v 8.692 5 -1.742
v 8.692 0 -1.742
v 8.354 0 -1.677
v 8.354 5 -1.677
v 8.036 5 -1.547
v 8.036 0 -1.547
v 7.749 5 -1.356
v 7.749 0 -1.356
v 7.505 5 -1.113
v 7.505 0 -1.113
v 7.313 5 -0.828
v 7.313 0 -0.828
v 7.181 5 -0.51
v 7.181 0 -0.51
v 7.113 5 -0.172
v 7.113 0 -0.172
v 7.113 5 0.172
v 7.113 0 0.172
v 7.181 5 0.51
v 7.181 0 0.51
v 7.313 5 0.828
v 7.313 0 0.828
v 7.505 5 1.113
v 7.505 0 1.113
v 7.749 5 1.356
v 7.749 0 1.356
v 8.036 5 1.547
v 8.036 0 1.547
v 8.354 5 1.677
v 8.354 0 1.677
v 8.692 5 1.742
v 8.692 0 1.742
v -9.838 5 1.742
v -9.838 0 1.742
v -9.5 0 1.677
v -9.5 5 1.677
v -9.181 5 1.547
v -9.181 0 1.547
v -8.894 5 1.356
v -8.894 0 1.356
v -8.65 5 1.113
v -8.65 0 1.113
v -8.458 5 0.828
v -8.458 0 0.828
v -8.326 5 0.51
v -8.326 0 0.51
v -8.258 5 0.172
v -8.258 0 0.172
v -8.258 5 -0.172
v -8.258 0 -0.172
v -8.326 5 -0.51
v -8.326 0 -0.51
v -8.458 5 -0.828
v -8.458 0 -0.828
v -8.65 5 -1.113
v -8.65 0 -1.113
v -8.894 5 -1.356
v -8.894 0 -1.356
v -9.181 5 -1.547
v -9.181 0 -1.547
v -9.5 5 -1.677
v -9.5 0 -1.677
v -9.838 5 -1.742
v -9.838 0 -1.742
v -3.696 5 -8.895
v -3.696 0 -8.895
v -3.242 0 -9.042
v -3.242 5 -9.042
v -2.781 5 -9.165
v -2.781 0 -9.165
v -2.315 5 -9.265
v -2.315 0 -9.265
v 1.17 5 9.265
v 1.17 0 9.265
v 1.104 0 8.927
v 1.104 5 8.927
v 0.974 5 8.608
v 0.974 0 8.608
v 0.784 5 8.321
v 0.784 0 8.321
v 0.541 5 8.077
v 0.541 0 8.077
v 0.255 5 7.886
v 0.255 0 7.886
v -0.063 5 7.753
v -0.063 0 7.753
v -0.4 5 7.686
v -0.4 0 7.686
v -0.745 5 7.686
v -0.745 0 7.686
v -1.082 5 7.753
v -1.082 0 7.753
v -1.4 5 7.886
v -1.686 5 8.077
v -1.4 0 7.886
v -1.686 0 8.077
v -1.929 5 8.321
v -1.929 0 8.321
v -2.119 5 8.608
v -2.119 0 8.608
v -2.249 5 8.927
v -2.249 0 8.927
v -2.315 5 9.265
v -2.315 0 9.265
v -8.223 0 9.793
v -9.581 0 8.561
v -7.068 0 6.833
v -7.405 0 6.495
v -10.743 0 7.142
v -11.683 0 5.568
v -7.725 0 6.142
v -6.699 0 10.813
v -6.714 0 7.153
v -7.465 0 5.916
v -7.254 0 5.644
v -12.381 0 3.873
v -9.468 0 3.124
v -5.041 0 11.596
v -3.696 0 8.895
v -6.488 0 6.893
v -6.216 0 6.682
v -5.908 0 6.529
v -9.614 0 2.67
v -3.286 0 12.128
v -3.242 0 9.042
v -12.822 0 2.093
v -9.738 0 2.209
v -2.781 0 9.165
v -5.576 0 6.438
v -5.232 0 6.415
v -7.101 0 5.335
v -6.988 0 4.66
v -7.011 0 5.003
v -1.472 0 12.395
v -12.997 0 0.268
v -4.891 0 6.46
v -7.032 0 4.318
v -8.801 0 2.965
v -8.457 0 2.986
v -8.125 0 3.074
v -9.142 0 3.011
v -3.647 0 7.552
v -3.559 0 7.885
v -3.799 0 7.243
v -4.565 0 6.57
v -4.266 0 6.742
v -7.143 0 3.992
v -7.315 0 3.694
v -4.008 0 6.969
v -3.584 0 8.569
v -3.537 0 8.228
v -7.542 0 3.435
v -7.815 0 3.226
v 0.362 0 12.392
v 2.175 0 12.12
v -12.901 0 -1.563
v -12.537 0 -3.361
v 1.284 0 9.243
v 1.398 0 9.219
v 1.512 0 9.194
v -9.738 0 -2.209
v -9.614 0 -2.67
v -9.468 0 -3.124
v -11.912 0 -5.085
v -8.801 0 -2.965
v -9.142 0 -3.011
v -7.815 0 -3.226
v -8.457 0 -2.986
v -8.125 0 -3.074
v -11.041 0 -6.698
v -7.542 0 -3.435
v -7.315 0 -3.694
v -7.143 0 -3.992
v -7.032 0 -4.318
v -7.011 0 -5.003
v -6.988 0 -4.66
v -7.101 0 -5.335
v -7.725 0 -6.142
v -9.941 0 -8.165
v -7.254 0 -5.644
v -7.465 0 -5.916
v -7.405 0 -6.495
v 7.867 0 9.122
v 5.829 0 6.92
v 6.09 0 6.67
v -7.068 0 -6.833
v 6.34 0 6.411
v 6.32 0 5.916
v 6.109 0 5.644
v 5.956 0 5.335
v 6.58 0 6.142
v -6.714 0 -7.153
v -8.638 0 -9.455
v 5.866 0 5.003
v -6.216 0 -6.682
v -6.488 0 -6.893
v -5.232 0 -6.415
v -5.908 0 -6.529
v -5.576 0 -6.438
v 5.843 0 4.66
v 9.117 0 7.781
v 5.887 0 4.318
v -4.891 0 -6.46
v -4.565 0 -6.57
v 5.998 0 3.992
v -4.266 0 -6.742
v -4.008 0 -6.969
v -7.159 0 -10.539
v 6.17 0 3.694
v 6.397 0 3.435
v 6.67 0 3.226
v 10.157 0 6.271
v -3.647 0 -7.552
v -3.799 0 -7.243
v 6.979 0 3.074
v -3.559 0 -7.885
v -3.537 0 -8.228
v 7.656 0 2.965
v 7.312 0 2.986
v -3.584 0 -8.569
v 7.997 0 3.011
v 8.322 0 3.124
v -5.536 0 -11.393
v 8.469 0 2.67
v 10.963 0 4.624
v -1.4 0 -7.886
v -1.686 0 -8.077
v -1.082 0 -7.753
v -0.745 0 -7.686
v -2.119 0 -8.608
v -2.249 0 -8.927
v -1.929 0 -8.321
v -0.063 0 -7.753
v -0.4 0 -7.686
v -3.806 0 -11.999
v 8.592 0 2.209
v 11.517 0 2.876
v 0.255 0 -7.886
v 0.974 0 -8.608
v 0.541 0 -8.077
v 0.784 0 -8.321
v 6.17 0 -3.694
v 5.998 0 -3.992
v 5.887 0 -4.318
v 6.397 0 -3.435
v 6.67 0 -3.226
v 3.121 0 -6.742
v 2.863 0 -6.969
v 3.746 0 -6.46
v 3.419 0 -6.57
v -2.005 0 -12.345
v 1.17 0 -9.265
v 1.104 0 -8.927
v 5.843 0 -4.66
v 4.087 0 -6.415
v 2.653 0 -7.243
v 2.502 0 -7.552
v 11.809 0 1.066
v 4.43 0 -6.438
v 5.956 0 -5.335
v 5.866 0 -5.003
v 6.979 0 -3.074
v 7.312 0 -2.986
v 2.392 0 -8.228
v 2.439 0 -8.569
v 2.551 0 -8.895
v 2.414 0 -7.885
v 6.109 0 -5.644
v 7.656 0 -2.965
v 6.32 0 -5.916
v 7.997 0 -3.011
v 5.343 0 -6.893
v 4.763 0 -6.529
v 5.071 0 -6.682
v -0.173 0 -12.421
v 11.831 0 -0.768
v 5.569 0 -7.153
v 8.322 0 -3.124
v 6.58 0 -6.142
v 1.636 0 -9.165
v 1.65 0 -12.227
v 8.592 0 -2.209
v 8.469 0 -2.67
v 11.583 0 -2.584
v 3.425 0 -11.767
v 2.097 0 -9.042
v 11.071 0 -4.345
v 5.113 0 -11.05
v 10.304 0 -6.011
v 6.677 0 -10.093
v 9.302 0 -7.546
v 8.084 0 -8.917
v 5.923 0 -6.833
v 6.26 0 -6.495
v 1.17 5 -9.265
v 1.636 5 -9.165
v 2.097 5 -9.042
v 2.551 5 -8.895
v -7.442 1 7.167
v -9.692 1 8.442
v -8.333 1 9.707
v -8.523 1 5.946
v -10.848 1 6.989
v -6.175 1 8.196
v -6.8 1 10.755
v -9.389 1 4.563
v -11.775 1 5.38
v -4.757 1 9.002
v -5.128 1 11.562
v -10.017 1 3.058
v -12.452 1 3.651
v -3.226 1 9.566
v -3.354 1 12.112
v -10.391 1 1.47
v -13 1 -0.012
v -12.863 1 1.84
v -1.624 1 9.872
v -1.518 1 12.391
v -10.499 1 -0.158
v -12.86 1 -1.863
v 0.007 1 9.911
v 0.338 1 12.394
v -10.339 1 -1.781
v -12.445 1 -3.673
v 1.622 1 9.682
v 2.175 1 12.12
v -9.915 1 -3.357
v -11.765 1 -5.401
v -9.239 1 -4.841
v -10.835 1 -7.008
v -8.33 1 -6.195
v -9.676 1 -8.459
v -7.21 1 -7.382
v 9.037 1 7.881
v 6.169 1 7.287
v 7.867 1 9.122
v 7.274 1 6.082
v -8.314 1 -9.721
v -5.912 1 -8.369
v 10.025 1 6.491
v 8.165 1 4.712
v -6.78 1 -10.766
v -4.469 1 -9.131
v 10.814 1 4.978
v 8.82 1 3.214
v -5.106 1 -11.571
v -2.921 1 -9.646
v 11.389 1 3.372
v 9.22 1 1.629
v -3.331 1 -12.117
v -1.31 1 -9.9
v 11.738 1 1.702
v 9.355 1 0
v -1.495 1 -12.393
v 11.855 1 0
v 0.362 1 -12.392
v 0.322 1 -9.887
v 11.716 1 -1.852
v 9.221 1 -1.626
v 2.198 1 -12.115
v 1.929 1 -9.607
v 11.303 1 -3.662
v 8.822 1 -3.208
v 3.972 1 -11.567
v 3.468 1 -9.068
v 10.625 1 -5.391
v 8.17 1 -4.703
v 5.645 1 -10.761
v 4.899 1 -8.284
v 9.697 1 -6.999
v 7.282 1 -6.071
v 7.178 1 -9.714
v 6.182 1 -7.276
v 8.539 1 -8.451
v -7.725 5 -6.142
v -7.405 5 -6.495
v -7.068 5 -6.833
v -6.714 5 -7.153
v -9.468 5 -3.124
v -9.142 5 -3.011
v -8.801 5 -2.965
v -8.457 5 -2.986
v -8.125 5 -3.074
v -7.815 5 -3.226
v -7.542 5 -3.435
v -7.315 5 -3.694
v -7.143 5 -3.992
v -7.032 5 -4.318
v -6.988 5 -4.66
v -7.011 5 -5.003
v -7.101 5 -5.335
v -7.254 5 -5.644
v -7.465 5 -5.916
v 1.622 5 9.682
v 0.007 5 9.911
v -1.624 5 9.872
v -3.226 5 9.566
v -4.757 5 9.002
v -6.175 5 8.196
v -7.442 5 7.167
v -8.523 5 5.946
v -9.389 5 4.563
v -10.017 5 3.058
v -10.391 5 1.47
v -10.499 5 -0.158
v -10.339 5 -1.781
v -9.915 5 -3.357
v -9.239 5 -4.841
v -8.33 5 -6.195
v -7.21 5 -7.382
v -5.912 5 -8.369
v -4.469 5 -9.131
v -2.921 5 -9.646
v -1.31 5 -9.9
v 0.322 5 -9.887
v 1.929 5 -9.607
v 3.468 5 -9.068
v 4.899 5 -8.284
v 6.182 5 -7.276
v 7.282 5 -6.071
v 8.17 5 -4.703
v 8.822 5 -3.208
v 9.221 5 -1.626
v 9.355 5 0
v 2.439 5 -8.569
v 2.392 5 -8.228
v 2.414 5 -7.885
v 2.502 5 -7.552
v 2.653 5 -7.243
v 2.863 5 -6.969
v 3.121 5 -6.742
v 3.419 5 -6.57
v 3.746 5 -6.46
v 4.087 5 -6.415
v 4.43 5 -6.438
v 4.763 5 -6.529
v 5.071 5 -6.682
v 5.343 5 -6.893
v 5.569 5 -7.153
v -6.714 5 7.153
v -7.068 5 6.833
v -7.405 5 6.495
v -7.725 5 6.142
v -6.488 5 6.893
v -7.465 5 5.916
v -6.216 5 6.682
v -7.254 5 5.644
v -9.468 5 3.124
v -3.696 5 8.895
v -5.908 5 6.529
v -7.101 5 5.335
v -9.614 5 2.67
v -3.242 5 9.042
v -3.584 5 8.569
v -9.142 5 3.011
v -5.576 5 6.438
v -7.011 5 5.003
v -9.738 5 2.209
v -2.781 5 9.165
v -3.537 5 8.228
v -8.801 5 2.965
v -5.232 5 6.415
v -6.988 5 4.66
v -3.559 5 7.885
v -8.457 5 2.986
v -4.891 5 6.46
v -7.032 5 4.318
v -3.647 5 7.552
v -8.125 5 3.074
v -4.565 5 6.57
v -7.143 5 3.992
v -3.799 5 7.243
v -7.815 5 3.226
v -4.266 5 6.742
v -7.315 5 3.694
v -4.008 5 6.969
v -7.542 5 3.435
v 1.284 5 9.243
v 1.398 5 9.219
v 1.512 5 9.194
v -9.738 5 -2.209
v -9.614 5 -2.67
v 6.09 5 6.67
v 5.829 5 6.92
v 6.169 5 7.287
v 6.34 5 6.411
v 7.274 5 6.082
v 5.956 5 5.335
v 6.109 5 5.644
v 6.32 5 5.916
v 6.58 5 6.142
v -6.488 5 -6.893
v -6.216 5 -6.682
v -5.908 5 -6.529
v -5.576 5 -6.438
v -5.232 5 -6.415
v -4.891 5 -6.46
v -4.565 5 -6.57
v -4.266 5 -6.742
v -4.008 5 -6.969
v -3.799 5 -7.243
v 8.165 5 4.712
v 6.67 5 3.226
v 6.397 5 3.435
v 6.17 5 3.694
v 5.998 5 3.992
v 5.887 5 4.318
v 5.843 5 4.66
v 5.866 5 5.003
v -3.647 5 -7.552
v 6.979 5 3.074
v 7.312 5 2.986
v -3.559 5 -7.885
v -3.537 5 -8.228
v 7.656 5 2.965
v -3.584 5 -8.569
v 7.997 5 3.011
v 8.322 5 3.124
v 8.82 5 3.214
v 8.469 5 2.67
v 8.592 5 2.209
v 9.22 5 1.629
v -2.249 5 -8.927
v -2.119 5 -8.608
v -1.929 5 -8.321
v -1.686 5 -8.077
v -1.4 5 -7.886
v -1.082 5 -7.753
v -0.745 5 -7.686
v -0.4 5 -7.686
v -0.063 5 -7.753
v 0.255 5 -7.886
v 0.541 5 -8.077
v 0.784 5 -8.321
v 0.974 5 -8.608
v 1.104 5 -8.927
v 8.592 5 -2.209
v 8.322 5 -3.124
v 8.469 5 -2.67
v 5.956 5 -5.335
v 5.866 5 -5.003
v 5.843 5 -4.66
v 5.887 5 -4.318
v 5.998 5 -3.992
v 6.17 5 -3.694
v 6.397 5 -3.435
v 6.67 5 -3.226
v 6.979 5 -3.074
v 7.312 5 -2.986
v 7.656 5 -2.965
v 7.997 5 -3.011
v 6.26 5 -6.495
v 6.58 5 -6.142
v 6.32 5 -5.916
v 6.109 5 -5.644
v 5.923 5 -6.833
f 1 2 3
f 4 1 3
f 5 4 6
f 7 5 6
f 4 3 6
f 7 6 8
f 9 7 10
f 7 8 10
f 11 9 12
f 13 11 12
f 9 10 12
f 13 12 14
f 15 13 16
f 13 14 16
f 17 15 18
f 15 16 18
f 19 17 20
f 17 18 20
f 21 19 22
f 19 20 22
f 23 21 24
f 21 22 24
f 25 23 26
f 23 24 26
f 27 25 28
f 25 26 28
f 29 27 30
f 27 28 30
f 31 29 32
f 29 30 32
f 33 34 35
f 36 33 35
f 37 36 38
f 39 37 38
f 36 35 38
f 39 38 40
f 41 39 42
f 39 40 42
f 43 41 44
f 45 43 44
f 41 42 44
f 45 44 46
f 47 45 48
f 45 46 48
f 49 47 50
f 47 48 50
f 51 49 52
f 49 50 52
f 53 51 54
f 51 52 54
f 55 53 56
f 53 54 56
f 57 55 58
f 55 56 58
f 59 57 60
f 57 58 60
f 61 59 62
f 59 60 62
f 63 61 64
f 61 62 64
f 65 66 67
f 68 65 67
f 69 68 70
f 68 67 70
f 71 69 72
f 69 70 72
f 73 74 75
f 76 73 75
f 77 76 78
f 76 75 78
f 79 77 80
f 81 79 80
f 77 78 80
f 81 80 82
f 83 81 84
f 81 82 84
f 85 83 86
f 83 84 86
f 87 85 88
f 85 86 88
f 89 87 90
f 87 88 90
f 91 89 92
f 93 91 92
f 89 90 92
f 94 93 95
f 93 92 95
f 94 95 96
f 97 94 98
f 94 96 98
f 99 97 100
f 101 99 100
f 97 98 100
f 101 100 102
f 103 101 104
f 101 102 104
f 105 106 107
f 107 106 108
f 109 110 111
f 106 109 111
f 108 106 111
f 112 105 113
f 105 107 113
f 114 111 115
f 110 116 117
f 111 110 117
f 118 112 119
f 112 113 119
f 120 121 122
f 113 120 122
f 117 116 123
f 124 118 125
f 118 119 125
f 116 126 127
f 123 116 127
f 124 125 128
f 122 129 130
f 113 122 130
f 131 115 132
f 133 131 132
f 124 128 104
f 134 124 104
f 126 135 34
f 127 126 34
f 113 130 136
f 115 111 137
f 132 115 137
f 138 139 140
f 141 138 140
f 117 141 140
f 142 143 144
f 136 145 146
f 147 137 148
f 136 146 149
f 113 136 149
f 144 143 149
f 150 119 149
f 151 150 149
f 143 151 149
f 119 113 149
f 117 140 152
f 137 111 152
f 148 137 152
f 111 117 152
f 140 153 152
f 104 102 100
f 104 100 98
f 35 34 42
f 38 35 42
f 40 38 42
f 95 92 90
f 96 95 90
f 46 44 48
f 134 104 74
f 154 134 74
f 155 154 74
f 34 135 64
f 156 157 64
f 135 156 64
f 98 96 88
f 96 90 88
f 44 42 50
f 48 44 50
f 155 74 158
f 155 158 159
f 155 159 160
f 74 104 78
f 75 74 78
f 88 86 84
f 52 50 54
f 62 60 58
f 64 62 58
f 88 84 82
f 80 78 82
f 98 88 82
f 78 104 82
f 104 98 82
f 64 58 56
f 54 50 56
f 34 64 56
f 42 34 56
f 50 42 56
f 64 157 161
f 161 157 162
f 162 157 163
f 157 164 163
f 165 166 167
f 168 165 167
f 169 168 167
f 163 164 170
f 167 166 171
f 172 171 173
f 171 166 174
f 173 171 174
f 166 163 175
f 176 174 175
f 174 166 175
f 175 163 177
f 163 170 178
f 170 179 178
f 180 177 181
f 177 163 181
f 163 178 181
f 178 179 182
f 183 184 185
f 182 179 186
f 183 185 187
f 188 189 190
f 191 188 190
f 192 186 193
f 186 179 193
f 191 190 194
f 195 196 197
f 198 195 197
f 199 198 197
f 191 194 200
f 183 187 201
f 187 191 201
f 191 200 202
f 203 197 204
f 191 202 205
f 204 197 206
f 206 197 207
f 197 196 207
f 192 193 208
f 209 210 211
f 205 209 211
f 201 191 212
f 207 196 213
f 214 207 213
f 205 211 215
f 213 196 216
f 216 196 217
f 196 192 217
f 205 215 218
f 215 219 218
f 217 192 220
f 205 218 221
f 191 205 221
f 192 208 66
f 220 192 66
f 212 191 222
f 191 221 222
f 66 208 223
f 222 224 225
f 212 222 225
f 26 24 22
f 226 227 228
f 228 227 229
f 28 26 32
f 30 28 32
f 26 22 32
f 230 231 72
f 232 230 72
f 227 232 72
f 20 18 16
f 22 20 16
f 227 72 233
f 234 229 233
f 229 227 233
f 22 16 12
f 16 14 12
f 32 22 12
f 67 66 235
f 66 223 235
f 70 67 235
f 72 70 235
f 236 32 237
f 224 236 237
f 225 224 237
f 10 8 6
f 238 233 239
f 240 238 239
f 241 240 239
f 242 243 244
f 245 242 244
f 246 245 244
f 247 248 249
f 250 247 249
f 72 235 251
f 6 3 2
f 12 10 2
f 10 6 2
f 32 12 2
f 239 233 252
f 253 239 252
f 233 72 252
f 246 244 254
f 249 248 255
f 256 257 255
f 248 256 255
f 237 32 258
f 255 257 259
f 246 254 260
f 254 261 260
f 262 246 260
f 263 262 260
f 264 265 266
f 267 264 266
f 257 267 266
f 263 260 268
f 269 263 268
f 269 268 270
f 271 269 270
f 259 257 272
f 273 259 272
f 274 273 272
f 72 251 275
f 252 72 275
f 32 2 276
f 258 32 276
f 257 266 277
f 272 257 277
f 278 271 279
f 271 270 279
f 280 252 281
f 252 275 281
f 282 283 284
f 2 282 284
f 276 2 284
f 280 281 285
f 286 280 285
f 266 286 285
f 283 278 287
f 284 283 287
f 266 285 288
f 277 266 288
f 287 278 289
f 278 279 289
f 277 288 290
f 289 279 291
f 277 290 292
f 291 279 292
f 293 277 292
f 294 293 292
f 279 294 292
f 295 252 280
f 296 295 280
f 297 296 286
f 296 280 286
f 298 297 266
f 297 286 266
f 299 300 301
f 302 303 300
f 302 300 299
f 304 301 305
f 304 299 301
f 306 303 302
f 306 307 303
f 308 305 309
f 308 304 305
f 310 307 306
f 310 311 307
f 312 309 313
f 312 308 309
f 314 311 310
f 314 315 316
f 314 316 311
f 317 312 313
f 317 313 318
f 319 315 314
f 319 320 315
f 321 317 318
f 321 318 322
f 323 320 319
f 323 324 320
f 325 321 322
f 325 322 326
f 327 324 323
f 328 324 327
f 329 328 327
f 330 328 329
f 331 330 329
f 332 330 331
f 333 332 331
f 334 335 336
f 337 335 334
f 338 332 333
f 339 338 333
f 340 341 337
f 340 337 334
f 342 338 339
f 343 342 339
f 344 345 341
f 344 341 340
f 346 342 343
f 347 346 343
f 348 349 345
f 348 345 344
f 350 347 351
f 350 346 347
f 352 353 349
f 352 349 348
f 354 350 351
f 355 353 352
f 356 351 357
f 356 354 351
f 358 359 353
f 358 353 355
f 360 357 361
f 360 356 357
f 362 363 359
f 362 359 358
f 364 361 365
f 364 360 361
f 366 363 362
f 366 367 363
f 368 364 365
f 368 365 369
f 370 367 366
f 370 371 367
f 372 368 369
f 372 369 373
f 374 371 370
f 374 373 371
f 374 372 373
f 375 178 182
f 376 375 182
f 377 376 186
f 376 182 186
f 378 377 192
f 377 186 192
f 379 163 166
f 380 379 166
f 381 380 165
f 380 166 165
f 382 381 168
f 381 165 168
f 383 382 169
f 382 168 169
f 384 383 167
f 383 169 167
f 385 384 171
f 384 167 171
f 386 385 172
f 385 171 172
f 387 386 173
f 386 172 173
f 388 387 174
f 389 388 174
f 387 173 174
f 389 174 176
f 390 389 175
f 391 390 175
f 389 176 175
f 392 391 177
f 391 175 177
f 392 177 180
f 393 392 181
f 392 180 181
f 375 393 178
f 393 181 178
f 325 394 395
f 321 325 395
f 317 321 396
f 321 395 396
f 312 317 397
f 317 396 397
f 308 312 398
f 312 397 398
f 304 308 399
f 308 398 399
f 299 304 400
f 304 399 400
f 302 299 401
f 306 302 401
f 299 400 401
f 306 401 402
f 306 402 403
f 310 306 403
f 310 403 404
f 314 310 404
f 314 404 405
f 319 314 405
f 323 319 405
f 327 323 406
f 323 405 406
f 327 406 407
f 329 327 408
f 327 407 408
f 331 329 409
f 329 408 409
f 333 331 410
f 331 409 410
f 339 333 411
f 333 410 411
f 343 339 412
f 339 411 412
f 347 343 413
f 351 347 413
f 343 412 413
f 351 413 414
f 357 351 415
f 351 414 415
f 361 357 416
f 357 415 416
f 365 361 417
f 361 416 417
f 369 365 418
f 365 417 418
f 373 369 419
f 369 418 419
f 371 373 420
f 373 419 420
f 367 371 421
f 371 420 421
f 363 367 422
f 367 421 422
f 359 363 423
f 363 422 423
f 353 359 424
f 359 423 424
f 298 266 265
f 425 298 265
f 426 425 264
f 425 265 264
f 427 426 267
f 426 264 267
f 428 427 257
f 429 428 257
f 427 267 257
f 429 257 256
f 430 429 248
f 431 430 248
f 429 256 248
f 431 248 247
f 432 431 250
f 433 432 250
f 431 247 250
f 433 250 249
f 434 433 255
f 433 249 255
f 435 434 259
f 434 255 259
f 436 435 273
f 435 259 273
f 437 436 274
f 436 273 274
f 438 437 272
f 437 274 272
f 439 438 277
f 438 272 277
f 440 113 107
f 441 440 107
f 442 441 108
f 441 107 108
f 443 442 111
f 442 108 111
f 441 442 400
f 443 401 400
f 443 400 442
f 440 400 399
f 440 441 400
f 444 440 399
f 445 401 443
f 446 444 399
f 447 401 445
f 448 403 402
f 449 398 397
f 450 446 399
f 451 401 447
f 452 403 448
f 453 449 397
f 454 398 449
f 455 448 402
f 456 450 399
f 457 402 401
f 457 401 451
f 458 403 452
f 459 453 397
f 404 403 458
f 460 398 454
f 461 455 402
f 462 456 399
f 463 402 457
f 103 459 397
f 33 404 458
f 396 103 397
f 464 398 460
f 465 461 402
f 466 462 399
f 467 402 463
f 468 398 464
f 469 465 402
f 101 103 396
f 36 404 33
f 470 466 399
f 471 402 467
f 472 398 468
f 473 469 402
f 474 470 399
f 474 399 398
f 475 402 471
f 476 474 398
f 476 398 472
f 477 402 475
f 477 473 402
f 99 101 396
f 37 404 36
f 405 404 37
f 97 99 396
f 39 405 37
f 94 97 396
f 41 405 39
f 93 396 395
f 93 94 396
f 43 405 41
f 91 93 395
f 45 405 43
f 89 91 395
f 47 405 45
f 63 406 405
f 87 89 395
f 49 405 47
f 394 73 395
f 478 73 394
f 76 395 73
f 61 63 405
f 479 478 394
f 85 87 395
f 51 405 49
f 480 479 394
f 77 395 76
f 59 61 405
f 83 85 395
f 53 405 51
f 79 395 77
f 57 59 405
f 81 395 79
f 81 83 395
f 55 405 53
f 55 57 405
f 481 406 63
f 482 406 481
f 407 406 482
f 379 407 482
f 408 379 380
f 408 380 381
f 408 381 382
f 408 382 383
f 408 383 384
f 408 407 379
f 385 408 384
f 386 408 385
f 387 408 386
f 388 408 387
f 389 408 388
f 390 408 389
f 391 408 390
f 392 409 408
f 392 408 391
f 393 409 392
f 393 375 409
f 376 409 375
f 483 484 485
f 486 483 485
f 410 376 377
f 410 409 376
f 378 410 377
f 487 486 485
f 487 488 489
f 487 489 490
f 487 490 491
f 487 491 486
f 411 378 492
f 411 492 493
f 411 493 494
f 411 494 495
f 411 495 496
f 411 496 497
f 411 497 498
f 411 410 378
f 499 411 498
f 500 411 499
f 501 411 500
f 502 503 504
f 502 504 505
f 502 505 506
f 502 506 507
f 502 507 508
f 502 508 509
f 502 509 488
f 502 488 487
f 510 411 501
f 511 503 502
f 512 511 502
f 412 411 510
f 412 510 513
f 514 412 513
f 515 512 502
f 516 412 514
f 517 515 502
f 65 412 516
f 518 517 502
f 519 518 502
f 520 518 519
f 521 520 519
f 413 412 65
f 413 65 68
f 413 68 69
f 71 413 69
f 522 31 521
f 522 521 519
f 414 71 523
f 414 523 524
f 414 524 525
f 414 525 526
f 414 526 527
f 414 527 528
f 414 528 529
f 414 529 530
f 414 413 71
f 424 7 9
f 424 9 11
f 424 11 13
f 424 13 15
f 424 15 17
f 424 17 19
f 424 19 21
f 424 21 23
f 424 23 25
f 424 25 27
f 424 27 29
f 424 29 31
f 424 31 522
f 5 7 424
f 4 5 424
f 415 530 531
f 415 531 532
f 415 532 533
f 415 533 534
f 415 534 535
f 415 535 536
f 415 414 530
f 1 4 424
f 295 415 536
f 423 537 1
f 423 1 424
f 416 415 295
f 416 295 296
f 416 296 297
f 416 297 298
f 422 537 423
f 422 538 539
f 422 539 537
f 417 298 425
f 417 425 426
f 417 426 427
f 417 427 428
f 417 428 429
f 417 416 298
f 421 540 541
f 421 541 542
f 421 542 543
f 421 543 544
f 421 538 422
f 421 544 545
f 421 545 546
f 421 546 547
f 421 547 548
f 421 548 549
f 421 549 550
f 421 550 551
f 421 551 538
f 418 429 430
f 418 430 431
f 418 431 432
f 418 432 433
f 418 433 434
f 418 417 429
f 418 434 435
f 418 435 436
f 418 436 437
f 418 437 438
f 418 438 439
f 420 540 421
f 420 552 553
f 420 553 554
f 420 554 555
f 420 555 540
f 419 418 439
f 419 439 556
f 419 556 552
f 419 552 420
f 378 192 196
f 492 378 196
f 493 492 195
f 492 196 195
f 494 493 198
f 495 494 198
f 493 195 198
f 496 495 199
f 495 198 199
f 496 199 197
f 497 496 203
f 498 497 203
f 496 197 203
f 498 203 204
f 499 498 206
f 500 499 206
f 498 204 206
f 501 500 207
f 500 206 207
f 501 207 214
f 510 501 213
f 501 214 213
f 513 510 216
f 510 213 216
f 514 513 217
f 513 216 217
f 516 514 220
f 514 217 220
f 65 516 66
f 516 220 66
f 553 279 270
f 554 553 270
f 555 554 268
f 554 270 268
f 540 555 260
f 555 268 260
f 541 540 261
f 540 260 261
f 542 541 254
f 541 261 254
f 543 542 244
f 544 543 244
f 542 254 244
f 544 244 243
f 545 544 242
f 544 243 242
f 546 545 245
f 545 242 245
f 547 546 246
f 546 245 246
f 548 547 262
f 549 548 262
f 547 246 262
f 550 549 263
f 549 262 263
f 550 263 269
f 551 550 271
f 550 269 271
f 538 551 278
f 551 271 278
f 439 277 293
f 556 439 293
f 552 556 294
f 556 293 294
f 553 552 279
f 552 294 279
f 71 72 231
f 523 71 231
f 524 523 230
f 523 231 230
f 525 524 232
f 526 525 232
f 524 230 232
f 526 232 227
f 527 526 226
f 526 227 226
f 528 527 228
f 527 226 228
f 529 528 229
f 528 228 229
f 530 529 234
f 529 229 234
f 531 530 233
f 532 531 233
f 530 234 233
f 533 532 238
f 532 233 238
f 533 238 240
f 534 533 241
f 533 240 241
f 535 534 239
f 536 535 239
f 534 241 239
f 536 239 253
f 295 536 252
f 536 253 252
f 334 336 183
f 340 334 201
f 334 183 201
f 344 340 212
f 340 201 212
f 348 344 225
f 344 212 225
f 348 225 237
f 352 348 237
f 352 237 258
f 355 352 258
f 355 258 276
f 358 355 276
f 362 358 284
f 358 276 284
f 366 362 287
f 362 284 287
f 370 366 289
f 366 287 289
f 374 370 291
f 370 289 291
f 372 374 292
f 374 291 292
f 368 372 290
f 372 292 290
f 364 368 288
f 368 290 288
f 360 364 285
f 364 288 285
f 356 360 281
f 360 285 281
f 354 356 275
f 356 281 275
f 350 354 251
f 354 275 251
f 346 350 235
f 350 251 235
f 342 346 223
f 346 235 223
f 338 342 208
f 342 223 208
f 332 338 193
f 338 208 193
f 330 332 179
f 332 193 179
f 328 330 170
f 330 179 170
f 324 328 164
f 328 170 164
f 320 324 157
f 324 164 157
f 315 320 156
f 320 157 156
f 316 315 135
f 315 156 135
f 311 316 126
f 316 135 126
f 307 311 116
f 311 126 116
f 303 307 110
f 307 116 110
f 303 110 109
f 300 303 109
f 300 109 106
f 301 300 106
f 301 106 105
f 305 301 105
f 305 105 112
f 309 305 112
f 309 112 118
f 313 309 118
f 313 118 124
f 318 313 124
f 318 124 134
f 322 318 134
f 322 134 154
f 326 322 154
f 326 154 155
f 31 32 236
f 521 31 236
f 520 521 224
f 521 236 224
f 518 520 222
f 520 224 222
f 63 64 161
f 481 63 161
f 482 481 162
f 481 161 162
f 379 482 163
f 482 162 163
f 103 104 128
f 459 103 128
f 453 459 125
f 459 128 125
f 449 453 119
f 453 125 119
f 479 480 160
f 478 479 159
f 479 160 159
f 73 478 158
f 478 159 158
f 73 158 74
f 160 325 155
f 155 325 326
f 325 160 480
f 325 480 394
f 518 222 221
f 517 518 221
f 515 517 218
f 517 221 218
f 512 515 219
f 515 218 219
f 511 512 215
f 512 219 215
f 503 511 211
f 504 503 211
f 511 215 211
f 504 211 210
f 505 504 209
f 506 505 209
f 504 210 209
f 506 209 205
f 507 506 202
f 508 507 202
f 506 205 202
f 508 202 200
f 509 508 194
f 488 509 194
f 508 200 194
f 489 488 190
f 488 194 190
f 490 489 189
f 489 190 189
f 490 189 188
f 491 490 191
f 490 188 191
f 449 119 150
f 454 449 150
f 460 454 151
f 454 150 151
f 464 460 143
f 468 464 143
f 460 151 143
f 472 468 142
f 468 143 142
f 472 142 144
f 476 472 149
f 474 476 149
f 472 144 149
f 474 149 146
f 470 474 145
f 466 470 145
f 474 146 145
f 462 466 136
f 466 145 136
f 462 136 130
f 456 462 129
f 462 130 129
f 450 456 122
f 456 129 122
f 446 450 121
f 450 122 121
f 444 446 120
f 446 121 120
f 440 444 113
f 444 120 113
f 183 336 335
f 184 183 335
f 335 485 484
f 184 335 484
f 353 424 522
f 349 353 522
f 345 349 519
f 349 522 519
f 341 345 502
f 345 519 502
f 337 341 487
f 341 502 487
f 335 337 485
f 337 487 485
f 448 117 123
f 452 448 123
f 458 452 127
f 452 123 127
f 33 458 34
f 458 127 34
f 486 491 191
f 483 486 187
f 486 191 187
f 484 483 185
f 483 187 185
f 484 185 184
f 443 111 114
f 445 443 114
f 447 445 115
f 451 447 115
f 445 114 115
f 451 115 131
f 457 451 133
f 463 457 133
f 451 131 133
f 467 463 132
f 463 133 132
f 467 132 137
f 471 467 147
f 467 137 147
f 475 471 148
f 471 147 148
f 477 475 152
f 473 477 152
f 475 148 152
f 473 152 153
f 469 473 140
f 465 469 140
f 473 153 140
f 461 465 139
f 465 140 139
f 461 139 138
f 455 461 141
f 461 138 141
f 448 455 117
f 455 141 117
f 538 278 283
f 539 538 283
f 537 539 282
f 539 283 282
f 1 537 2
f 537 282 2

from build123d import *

# Parameters (mm, degrees)
SKETCH1_R           = 12.427436065
BOSS_EXTRUDE1_DEPTH = 5
CUT_EXTRUDE1_DEPTH  = 4
CUT_EXTRUDE2_DEPTH  = 6


with BuildPart() as part:
    # Sketch1 → Boss-Extrude1 (new body)
    with BuildSketch(Plane(origin=(0, 0, 0), x_dir=(1, 0, 0), z_dir=(0, 1, 0))):
        with Locations((-0.572563935, 0)):
            Circle(SKETCH1_R)
        with BuildLine():
            ThreePointArc((-9.837575138, 1.742446029), (-9.678767906, 2.44), (-9.467522018, 3.123503075))
            ThreePointArc((-9.467522018, 3.123503075), (-7.221418603, 3.838718032), (-7.725075989, 6.141508127))
            ThreePointArc((-7.725075989, 6.141508127), (-7.238767906, 6.66620397), (-6.714072063, 7.152512053))
            ThreePointArc((-6.714072063, 7.152512053), (-4.411281968, 6.648854668), (-3.696067011, 8.894958082))
            ThreePointArc((-3.696067011, 8.894958082), (-3.012563935, 9.10620397), (-2.315009965, 9.265011203))
            ThreePointArc((-2.315009965, 9.265011203), (-0.572563935, 7.677436065), (1.169882094, 9.265011203))
            ThreePointArc((1.169882094, 9.265011203), (1.867436065, 9.10620397), (2.55093914, 8.894958082))
            ThreePointArc((2.55093914, 8.894958082), (3.266154097, 6.648854668), (5.568944192, 7.152512053))
            ThreePointArc((5.568944192, 7.152512053), (6.093640035, 6.66620397), (6.579948118, 6.141508127))
            ThreePointArc((6.579948118, 6.141508127), (6.076290732, 3.838718032), (8.322394147, 3.123503075))
            ThreePointArc((8.322394147, 3.123503075), (8.533640035, 2.44), (8.692447267, 1.742446029))
            ThreePointArc((8.692447267, 1.742446029), (7.104872129, 0), (8.692447267, -1.742446029))
            ThreePointArc((8.692447267, -1.742446029), (8.533640035, -2.44), (8.322394147, -3.123503075))
            ThreePointArc((8.322394147, -3.123503075), (6.076290732, -3.838718032), (6.579948118, -6.141508127))
            ThreePointArc((6.579948118, -6.141508127), (6.093640035, -6.66620397), (5.568944192, -7.152512053))
            ThreePointArc((5.568944192, -7.152512053), (3.266154097, -6.648854668), (2.55093914, -8.894958082))
            ThreePointArc((2.55093914, -8.894958082), (1.867436065, -9.10620397), (1.169882094, -9.265011203))
            ThreePointArc((1.169882094, -9.265011203), (-0.572563935, -7.677436065), (-2.315009965, -9.265011203))
            ThreePointArc((-2.315009965, -9.265011203), (-3.012563935, -9.10620397), (-3.696067011, -8.894958082))
            ThreePointArc((-3.696067011, -8.894958082), (-4.411281968, -6.648854668), (-6.714072063, -7.152512053))
            ThreePointArc((-6.714072063, -7.152512053), (-7.238767906, -6.66620397), (-7.725075989, -6.141508127))
            ThreePointArc((-7.725075989, -6.141508127), (-7.221418603, -3.838718032), (-9.467522018, -3.123503075))
            ThreePointArc((-9.467522018, -3.123503075), (-9.678767906, -2.44), (-9.837575138, -1.742446029))
            ThreePointArc((-9.837575138, -1.742446029), (-8.25, 0), (-9.837575138, 1.742446029))
        make_face(mode=Mode.SUBTRACT)
    extrude(amount=BOSS_EXTRUDE1_DEPTH)

    # Sketch3 → Cut-Extrude1 (cut)
    with BuildSketch(Plane(origin=(0, 5, 0), x_dir=(1, 0, 0), z_dir=(0, 1, 0))):
        with BuildLine():
            ThreePointArc((6.169043579, -7.287298192), (4.053237314, -8.783845947), (1.622190338, -9.681789116))
            Line((1.622190338, -9.681789116), (2.17488951, -12.119928494))
            ThreePointArc((2.17488951, -12.119928494), (5.218140623, -10.995858668), (7.866764791, -9.122439246))
            Line((7.866764791, -9.122439246), (6.169043579, -7.287298192))
        make_face()
        with BuildLine():
            Line((2.17488951, -12.119928494), (1.622190338, -9.681789116))
            ThreePointArc((1.622190338, -9.681789116), (-8.329569464, 6.19538958), (9.354872129, 0))
            ThreePointArc((9.354872129, 0), (8.523612855, -3.976626035), (6.169043579, -7.287298192))
            Line((6.169043579, -7.287298192), (7.866764791, -9.122439246))
            ThreePointArc((7.866764791, -9.122439246), (10.814279027, -4.978049265), (11.854872129, 0))
            ThreePointArc((11.854872129, 0), (-10.282995676, 7.755558172), (2.17488951, -12.119928494))
        make_face()
    extrude(amount=-CUT_EXTRUDE1_DEPTH, mode=Mode.SUBTRACT)

    # Sketch3<3> → Cut-Extrude2 (cut, through all)
    with BuildSketch(Plane(origin=(0, 5, 0), x_dir=(1, 0, 0), z_dir=(0, 1, 0))):
        Polygon((55.39886132, -60.501959687), (7.866764791, -9.122439246), (-0.572563935, 0), (2.17488951, -12.119928494), (17.649132378, -80.381946696), (82.878094772, -204.24398184), (120.627823714, -184.363994832), align=None)
    extrude(amount=-CUT_EXTRUDE2_DEPTH, mode=Mode.SUBTRACT)


solid = part.part
